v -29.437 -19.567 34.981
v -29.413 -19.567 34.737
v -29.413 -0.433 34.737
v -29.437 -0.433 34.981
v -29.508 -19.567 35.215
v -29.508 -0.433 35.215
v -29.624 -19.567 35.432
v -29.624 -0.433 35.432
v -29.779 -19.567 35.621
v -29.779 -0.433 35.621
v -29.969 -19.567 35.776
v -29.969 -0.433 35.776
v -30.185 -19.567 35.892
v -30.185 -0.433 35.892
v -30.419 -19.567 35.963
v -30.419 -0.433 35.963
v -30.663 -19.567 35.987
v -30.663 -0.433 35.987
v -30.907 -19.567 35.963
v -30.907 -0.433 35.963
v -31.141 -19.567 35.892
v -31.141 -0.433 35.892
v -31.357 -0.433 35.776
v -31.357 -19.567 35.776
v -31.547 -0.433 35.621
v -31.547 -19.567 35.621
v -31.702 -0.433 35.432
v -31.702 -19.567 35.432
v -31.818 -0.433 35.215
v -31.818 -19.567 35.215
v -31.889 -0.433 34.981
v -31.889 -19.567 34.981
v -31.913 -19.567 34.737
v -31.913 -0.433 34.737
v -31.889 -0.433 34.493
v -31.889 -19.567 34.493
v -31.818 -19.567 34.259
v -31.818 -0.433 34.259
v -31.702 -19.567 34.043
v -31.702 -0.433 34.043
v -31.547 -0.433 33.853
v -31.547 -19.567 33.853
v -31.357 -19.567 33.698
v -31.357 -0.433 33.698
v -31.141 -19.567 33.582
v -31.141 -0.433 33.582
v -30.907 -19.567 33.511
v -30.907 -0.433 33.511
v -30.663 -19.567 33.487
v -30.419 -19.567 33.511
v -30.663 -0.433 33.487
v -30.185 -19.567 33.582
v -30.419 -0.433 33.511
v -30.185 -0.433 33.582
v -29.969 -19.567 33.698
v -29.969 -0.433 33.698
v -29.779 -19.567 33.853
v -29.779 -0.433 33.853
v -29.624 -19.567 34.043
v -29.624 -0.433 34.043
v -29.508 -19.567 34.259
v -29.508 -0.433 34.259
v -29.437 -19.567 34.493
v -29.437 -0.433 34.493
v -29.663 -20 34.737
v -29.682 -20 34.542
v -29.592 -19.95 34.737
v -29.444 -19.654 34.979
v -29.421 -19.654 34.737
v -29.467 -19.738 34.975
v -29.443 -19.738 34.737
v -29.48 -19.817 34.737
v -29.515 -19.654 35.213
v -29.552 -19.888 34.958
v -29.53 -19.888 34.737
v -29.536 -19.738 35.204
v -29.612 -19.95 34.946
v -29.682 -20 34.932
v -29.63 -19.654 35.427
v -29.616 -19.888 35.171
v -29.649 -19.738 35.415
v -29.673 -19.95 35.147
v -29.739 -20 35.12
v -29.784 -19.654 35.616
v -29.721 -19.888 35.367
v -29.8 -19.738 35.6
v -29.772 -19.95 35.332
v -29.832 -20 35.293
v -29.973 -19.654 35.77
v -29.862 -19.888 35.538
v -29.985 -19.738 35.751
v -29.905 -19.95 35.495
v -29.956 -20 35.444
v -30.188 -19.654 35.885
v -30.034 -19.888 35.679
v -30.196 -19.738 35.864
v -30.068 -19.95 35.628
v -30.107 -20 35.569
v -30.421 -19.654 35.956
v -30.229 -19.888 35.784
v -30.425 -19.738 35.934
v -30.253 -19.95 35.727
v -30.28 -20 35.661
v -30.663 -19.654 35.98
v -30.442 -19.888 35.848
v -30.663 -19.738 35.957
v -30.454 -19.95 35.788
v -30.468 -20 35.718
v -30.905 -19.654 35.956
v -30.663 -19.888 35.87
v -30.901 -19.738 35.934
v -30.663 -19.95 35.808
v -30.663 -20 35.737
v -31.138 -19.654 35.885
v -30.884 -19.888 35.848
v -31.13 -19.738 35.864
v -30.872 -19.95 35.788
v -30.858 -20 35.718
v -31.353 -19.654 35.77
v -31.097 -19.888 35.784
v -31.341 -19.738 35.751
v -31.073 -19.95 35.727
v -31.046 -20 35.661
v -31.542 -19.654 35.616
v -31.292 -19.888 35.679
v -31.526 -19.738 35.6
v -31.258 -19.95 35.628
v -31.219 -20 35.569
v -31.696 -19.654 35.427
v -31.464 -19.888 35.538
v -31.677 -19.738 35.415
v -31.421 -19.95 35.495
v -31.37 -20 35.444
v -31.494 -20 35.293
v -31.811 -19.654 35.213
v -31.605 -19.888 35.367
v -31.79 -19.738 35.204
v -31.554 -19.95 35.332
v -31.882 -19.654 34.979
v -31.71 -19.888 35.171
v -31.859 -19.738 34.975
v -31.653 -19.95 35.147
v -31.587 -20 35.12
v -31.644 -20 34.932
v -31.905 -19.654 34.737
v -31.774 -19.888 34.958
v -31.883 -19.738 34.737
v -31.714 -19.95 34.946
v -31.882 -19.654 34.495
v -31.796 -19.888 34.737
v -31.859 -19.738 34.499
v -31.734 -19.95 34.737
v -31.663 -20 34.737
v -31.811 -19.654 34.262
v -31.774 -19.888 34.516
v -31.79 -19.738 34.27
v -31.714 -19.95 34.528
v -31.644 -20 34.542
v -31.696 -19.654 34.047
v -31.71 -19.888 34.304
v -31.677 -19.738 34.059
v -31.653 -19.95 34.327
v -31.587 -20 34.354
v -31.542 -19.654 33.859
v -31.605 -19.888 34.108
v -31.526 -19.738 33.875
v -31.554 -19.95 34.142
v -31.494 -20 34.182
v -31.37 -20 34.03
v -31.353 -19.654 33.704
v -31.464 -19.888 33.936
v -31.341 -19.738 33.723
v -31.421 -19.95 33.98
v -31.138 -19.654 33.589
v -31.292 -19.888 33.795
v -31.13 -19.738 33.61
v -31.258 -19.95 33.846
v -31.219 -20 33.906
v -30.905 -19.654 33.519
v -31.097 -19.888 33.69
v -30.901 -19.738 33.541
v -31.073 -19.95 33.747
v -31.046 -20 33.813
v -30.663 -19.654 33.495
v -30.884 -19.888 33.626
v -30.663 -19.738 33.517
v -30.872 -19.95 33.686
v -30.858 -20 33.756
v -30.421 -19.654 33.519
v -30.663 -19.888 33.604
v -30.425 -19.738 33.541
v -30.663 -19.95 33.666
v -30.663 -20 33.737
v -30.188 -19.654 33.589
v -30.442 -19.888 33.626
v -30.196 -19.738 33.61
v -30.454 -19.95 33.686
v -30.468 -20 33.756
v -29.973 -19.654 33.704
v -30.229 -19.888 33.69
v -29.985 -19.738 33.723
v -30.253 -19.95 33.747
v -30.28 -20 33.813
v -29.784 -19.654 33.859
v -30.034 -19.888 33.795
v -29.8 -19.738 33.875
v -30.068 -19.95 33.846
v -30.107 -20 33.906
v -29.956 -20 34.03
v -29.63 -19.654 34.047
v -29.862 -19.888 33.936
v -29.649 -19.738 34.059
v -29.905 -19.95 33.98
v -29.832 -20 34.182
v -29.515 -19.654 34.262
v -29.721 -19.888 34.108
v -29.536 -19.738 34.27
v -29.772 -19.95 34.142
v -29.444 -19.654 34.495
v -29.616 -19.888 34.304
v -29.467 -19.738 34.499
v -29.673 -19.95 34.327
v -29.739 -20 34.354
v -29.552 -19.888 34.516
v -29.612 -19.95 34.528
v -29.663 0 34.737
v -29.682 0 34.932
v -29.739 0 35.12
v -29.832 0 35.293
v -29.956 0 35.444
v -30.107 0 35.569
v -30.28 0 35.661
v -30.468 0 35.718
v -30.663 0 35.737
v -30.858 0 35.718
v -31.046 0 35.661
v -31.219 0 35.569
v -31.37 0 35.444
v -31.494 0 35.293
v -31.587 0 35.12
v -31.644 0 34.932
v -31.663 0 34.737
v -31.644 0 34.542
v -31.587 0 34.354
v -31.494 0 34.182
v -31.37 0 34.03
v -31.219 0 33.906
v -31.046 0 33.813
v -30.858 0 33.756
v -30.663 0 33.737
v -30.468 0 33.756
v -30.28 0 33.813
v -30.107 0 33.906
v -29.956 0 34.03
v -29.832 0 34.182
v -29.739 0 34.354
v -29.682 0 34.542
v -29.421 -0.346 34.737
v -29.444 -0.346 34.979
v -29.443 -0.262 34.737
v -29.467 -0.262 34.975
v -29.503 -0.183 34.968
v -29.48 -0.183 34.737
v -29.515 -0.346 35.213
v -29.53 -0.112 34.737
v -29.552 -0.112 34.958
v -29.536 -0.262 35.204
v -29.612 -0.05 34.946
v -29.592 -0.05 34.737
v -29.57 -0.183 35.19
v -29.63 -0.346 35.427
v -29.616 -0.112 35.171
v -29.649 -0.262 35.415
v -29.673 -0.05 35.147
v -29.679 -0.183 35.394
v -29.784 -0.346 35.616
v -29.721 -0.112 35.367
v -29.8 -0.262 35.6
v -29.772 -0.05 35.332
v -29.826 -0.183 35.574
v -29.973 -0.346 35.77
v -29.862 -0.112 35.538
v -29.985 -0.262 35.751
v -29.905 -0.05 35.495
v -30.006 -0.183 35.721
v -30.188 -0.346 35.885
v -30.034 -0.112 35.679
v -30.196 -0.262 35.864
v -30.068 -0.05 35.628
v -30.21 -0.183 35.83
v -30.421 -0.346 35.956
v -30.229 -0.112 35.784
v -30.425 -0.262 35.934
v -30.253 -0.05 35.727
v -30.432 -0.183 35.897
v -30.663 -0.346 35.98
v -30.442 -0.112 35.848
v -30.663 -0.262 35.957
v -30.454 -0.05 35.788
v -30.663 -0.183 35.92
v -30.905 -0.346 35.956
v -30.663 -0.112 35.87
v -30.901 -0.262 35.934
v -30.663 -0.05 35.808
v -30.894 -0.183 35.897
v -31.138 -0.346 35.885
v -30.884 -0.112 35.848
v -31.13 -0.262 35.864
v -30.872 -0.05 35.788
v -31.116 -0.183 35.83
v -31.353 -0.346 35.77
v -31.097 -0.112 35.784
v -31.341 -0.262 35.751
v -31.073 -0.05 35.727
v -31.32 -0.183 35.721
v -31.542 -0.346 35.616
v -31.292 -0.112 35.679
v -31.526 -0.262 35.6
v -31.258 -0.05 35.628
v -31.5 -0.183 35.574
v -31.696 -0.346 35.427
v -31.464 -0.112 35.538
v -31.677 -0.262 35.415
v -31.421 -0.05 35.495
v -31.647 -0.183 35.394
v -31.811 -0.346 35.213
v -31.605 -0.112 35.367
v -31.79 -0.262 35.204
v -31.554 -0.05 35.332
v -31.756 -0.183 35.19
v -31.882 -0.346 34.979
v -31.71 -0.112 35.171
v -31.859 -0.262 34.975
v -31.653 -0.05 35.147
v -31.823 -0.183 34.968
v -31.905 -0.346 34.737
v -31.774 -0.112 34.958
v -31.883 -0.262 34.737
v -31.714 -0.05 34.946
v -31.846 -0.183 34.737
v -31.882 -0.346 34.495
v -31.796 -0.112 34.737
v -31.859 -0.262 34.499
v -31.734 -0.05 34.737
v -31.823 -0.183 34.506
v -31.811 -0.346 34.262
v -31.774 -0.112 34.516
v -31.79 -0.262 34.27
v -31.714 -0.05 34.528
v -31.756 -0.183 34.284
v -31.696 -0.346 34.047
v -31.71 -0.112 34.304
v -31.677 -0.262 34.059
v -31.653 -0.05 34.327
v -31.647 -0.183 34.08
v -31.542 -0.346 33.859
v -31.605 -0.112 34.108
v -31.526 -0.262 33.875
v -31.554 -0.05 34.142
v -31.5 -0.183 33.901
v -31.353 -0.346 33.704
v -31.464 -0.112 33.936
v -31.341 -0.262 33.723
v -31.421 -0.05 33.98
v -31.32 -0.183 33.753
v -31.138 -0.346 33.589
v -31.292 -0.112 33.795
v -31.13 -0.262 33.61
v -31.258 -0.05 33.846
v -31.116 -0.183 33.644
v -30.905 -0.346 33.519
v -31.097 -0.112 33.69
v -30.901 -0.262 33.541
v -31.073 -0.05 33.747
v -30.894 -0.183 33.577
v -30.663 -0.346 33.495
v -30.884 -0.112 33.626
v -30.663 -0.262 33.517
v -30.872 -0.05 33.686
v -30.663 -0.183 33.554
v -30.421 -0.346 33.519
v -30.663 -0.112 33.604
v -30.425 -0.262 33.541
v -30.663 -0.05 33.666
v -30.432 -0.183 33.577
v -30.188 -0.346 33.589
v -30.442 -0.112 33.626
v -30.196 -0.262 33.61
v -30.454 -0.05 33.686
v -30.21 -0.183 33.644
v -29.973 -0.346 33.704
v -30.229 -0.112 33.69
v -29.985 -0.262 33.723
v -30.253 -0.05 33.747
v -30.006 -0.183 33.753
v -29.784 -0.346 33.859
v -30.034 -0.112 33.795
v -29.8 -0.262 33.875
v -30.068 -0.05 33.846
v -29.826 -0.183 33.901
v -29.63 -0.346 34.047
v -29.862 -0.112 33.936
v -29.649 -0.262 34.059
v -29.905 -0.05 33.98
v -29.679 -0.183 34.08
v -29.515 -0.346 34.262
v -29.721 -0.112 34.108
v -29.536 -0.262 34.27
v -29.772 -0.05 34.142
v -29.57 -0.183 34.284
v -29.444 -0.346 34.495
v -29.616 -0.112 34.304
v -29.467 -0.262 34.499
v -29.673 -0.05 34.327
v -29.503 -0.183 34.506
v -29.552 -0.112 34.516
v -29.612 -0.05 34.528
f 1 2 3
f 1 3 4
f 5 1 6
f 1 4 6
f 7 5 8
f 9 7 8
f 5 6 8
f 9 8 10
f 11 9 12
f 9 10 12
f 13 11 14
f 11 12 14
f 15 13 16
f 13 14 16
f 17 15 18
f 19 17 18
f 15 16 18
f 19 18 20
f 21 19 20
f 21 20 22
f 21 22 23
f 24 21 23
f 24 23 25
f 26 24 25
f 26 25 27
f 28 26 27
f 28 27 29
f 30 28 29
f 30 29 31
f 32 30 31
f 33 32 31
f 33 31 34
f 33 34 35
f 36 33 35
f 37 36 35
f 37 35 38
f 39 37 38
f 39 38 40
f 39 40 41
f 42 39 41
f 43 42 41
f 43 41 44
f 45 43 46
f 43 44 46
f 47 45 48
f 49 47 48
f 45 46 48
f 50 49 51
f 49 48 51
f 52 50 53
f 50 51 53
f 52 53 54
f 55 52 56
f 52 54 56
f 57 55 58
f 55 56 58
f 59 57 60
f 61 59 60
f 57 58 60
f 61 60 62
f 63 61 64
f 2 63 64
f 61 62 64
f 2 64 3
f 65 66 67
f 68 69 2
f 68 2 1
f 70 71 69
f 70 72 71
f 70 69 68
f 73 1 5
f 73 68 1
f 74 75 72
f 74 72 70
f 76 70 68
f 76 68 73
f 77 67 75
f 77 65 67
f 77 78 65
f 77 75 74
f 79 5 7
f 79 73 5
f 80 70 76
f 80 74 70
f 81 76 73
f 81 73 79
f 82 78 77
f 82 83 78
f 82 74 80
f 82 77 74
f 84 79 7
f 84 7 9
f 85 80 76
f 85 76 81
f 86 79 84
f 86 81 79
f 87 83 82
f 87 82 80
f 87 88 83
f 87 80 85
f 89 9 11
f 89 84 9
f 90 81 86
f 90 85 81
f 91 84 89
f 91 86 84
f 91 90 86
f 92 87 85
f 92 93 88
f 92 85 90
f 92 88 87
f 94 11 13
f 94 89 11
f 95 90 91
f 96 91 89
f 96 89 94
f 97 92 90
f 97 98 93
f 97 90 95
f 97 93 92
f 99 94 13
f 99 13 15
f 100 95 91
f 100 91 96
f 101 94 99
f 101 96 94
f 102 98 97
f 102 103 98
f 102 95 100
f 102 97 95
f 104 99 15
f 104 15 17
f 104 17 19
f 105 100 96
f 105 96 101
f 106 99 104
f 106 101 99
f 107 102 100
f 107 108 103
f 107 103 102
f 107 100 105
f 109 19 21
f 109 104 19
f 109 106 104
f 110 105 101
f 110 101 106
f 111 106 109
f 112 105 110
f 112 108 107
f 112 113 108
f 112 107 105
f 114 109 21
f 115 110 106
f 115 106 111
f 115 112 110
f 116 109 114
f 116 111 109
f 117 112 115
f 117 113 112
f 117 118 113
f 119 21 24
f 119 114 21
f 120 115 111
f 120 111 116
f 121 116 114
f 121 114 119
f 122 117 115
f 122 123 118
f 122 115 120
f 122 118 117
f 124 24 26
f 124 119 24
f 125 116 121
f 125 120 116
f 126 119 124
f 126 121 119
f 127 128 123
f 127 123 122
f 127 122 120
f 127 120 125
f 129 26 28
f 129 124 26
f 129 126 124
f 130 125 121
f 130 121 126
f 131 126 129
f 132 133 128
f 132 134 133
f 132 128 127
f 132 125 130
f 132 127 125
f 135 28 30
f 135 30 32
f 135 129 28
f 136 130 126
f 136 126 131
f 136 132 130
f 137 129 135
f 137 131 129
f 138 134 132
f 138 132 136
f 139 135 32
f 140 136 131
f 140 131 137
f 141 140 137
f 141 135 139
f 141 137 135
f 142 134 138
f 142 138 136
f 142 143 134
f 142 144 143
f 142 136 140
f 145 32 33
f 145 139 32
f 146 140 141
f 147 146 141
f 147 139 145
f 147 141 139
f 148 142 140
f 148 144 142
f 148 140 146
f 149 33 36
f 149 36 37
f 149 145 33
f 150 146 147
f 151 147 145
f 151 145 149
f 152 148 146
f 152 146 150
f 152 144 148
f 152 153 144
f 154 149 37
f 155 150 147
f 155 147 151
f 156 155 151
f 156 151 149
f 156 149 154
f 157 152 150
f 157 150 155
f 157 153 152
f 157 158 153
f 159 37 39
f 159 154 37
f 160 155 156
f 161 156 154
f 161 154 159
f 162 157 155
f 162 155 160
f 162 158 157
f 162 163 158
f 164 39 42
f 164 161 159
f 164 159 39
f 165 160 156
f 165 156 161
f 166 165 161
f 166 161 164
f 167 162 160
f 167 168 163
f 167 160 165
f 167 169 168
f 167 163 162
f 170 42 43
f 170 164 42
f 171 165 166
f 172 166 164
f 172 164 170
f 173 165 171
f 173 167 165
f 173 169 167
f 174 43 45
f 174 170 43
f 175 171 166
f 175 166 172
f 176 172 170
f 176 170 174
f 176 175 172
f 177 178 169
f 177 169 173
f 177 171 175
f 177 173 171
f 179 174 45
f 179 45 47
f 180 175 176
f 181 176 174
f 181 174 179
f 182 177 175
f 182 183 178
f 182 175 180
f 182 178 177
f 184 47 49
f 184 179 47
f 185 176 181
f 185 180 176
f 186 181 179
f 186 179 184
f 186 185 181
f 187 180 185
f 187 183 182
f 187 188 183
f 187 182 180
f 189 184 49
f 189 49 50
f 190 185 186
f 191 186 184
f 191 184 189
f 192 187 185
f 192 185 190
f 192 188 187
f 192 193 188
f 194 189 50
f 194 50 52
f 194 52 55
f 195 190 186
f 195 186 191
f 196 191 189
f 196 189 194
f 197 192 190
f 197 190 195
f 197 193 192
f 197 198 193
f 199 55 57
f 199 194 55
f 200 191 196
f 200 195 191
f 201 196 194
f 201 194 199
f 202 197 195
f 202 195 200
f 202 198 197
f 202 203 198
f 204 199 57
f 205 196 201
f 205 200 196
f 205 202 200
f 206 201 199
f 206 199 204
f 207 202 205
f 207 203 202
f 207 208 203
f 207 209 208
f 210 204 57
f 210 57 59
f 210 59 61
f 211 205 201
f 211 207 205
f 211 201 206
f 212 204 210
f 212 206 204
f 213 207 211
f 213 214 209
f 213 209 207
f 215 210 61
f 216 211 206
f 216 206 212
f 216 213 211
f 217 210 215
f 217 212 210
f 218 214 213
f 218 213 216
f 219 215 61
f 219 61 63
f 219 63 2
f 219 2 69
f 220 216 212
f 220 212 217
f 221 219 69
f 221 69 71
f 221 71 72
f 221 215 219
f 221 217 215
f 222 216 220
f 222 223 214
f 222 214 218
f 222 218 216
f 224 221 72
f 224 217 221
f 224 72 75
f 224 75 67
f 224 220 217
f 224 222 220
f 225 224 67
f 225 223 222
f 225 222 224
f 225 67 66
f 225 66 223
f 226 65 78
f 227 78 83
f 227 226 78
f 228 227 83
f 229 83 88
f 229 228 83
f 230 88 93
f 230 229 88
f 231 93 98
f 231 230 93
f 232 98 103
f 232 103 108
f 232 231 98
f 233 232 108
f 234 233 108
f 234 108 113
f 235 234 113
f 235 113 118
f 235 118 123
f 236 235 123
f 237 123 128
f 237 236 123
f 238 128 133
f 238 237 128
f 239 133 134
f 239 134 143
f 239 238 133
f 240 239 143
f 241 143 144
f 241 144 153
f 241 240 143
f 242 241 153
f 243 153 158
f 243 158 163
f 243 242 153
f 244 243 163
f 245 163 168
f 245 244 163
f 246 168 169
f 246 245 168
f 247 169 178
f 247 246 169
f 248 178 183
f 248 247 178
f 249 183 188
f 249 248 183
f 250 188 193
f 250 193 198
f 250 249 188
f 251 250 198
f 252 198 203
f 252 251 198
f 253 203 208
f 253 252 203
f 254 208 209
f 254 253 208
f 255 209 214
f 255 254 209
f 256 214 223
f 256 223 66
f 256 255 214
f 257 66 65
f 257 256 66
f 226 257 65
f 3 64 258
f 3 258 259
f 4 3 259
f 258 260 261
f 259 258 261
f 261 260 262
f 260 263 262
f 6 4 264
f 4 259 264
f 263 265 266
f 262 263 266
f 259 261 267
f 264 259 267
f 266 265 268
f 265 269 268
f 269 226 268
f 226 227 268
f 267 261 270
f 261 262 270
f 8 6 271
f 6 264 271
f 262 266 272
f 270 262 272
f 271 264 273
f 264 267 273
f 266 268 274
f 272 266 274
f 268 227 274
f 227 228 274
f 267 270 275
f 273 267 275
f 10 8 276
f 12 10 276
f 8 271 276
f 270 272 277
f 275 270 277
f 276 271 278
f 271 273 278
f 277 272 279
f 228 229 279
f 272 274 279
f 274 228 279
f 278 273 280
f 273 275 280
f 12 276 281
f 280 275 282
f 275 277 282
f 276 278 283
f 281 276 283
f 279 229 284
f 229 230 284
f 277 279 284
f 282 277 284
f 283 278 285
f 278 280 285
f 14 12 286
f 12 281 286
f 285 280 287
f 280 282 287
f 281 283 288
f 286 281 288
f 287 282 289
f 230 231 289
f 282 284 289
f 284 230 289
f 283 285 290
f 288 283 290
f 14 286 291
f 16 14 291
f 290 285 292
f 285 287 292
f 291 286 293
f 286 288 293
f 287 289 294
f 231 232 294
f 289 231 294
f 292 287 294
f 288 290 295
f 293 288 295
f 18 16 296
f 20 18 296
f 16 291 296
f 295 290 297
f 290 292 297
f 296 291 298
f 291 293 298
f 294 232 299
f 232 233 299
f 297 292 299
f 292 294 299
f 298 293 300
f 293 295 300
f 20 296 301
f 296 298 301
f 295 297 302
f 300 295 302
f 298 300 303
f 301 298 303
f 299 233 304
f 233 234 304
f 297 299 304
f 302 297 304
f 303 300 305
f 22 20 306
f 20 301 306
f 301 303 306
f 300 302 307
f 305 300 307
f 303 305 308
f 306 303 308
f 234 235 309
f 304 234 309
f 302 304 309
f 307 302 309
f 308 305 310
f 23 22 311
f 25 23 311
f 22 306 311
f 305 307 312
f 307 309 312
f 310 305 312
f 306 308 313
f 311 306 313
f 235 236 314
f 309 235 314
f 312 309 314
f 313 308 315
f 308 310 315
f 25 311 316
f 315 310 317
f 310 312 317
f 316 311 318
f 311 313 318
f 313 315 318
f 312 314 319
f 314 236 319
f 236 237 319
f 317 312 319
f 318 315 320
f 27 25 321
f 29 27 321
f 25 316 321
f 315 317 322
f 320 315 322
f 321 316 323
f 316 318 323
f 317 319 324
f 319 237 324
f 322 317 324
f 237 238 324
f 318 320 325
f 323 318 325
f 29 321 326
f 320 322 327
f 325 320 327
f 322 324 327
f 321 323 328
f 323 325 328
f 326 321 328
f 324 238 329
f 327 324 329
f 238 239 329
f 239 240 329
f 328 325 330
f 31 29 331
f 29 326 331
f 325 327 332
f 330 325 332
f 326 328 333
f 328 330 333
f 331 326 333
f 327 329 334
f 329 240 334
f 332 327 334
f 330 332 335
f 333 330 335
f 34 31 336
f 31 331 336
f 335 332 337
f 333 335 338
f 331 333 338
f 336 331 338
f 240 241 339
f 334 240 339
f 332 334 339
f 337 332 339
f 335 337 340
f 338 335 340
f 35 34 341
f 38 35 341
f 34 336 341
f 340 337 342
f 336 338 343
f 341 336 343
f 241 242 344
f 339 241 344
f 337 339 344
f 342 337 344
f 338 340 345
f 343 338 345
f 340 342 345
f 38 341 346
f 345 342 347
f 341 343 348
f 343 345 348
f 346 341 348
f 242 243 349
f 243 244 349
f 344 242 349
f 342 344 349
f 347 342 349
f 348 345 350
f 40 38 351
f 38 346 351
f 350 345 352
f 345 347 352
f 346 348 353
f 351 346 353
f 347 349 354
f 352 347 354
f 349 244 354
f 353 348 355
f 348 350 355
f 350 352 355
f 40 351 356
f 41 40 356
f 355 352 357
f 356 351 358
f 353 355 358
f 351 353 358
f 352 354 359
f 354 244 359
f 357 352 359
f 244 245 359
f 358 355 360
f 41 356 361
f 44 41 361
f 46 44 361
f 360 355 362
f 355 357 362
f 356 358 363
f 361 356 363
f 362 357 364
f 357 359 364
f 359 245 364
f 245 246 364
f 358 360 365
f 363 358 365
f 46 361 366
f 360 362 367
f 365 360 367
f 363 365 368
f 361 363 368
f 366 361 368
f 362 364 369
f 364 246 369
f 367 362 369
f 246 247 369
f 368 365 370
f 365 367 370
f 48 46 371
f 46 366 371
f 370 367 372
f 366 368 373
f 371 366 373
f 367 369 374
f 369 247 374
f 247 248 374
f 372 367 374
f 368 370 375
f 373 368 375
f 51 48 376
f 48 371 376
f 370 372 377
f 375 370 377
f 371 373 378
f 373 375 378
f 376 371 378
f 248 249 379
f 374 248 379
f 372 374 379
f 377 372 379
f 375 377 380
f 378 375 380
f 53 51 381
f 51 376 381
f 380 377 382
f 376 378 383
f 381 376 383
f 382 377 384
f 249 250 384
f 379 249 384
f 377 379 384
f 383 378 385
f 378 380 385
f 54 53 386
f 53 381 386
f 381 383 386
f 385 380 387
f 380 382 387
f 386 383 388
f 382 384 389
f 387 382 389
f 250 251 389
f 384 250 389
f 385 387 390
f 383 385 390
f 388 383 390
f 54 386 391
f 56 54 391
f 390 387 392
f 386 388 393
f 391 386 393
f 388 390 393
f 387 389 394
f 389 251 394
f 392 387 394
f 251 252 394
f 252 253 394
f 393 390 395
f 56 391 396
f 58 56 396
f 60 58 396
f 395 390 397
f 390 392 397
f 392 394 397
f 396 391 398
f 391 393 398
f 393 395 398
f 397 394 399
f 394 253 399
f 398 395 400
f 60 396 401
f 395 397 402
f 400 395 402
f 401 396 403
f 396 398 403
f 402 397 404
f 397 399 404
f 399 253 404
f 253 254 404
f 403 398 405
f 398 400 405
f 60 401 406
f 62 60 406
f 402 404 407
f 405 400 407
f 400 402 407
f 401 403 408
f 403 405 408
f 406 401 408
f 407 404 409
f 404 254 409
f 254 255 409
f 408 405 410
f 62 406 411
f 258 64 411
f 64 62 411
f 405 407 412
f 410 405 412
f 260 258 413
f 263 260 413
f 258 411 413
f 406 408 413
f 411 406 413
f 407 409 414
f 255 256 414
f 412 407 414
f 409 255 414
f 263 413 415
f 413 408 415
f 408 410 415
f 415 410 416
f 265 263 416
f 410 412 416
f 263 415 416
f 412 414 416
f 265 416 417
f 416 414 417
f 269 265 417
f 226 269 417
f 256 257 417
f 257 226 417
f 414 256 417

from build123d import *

# Parameters (mm, degrees)
F0_R     = 1.25
F0_R_2   = 1
F1_DEPTH = 20


# Not quite as in the source:
# - a fillet or chamfer that OpenCascade refuses, or shapes differently, is made with other operations: its cross-section is extruded or revolved along the edge and cut away or added


with BuildPart() as f1:
    # F0 (on Front) → F1 (new body)
    with BuildSketch(Plane.XZ):
        with Locations((-30.6629948318, 34.7370989621)):
            Circle(F0_R)
        with Locations((-30.6629948318, 34.7370989621)):
            Circle(F0_R_2, mode=Mode.SUBTRACT)
    extrude(amount=F1_DEPTH)

    # F2: fillet of radius 0.5 on 1 edges, made by hand

    # F2_s1 → F2_t2 (revolve, cut)
    with BuildSketch(Plane.XY.offset(34.7370989621)):
        with BuildLine():
            ThreePointArc((-29.4129948318, -19.5669872981), (-29.4799821299, -19.8169872981), (-29.6629948318, -20))
            Line((-29.6629948318, -20), (-29.4129948318, -20))
            Line((-29.4129948318, -20), (-29.4129948318, -19.5669872981))
        make_face()
    revolve(axis=Axis((-30.6629948318, -20, 34.7370989621), (0, -1, 0)), mode=Mode.SUBTRACT)

    # F3: fillet of radius 0.5 on 1 edges, made by hand

    # F3_s1 → F3_t2 (revolve, cut)
    with BuildSketch(Plane.XY.offset(34.7370989621)):
        with BuildLine():
            ThreePointArc((-29.4129948318, -0.4330127019), (-29.4799821299, -0.1830127019), (-29.6629948318, 0))
            Line((-29.6629948318, 0), (-29.4129948318, 0))
            Line((-29.4129948318, 0), (-29.4129948318, -0.4330127019))
        make_face()
    revolve(axis=Axis((-30.6629948318, 0, 34.7370989621), (0, -1, 0)), mode=Mode.SUBTRACT)


solid = f1.part
